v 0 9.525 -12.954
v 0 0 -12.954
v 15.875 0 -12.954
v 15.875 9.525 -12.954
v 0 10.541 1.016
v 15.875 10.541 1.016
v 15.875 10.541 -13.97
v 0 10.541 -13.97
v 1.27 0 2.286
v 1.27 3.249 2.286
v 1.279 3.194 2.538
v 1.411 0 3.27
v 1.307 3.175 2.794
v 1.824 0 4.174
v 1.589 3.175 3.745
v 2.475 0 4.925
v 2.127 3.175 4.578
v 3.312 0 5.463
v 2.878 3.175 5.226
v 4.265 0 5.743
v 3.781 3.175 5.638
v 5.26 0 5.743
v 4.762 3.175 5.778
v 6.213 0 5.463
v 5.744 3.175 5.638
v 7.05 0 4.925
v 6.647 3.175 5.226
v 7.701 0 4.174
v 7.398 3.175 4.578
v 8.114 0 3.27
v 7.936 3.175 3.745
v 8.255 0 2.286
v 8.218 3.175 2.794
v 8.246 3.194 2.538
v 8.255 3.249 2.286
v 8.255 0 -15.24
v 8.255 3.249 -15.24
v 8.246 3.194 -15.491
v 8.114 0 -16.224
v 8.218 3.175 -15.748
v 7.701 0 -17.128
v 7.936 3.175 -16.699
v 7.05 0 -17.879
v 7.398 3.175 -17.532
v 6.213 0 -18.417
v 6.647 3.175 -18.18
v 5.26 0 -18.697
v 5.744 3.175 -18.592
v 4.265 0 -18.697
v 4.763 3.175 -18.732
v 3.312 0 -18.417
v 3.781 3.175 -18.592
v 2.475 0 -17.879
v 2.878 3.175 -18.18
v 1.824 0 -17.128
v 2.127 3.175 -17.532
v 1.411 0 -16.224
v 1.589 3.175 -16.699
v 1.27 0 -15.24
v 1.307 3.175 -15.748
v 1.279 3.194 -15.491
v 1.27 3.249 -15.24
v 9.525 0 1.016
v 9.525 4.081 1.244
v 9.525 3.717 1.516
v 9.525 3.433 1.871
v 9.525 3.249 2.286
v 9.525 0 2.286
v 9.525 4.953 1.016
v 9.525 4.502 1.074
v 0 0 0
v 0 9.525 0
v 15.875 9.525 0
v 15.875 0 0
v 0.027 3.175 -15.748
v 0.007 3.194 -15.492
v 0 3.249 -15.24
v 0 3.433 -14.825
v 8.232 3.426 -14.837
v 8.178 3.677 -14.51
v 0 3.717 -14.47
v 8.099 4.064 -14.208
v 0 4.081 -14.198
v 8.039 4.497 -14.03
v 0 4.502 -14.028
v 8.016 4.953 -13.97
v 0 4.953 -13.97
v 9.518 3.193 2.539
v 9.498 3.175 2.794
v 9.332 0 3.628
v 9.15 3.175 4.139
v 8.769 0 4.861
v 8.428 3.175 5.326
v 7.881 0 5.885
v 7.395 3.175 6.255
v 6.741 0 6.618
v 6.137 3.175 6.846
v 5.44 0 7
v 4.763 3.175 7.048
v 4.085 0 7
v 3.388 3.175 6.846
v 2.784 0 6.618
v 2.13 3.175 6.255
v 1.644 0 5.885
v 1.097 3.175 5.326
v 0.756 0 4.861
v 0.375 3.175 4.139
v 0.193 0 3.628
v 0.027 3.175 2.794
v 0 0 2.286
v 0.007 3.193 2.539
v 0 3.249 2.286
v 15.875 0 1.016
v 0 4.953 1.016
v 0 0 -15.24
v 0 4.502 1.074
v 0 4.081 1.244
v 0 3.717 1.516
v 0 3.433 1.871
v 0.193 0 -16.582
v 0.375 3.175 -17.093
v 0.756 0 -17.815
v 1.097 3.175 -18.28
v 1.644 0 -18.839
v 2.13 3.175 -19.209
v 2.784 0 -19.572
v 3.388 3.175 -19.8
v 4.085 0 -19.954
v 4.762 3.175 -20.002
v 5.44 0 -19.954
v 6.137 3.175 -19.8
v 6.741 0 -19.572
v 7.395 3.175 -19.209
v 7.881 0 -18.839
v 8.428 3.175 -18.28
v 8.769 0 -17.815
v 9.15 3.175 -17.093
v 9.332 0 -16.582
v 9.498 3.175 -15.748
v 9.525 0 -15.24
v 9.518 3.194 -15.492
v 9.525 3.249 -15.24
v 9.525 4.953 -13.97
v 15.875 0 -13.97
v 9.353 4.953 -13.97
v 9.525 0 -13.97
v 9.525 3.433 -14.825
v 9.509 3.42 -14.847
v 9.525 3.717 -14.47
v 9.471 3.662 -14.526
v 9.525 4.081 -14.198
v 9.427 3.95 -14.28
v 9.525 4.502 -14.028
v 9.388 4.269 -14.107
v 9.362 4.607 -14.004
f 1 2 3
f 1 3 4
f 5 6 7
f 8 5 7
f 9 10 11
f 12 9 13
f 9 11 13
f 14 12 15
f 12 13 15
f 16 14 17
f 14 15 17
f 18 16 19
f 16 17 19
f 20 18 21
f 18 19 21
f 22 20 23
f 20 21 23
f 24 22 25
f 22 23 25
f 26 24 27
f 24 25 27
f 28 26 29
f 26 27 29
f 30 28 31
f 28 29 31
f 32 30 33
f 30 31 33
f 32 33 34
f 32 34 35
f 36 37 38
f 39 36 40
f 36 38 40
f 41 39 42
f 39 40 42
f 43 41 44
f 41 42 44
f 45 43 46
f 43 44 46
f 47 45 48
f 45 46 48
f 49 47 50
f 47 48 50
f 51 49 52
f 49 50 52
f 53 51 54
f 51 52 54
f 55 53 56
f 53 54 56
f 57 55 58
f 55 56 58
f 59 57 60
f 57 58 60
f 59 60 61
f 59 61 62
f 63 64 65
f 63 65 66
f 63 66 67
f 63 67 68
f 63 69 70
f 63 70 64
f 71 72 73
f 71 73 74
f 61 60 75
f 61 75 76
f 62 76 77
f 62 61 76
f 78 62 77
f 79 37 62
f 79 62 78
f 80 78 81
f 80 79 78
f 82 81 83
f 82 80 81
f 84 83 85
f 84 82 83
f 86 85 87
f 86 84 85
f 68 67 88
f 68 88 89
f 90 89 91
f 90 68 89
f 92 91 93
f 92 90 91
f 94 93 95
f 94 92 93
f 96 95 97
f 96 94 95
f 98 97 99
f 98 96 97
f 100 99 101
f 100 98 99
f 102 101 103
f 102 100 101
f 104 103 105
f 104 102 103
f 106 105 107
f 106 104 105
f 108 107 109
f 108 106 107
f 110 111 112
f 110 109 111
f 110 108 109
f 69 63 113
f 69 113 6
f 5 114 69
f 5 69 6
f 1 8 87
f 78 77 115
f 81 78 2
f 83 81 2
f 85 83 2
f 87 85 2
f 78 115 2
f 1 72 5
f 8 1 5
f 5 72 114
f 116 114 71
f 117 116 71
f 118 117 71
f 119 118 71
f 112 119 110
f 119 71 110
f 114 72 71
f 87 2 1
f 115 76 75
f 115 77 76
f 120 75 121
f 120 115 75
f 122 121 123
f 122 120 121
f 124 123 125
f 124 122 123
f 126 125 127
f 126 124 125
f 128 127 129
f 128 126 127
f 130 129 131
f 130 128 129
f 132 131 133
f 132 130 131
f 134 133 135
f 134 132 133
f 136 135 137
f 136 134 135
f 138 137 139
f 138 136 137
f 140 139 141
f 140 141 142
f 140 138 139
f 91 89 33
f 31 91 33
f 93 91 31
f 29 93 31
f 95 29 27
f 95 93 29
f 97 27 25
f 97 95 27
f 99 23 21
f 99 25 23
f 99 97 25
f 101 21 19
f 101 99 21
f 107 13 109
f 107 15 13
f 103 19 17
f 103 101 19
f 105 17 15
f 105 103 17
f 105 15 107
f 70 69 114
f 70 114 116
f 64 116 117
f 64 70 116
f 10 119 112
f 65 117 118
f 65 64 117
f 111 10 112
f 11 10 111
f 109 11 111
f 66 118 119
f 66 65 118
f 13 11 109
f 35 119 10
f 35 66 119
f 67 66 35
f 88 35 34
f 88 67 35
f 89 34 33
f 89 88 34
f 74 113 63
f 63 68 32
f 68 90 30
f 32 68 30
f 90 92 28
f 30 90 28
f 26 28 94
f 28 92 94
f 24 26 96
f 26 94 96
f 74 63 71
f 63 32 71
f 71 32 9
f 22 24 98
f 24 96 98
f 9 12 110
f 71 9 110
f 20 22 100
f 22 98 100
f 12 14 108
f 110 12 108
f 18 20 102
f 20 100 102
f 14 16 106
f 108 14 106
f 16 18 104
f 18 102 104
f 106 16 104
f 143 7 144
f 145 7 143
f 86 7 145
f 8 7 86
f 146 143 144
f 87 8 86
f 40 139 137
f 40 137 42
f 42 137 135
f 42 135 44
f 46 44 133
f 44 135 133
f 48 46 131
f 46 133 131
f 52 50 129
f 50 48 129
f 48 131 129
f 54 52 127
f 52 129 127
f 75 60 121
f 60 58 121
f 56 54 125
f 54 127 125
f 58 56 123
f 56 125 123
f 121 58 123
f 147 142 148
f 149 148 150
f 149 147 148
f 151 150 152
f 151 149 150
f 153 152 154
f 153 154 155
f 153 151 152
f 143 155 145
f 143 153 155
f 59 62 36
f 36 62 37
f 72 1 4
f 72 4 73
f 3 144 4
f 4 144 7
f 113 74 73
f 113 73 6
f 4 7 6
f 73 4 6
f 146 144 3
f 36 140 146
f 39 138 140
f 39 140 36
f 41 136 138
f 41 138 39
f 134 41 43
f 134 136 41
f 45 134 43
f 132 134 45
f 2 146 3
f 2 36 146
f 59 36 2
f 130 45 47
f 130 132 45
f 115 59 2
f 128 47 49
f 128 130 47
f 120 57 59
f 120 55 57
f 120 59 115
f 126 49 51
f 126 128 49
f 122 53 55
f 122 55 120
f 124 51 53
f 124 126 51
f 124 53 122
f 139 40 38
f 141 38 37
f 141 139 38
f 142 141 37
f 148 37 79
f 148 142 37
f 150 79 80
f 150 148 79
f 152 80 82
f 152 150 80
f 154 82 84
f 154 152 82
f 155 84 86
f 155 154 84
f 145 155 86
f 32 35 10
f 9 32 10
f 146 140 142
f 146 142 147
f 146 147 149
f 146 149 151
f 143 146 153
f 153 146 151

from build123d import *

# Parameters (mm, degrees)
BOSS_EXTRUDE1_DEPTH = 15.875
BOSS_EXTRUDE2_DEPTH = 3.175
CUT_EXTRUDE1_REACH  = 24.393
FILLET2_R           = 1.778
FILLET3_R           = 1.778


with BuildPart() as part:
    # Sketch1 → Boss-Extrude1 (new body)
    with BuildSketch(Plane(origin=(0, 0, 0), x_dir=(0, 0, -1), z_dir=(1, 0, 0))):
        Polygon((0, 0), (-1.016, 0), (-1.016, 10.541), (13.97, 10.541), (13.97, 0), (12.954, 0), (12.954, 9.525), (0, 9.525), align=None)
    extrude(amount=BOSS_EXTRUDE1_DEPTH)

    # Sketch2 → Boss-Extrude2 (add)
    with BuildSketch(Plane.XZ):
        with BuildLine():
            Line((9.525, 2.286), (9.525, 1.016))
            Line((9.525, 1.016), (0, 1.016))
            Line((0, 1.016), (0, 2.286))
            ThreePointArc((0, 2.286), (4.7625, 7.0485), (9.525, 2.286))
        make_face()
    boss_extrude2 = extrude(amount=-BOSS_EXTRUDE2_DEPTH)

    # Sketch4 → Cut-Extrude1 (cut, up to next)
    with BuildSketch(Plane(origin=(0, 3.175, 0), x_dir=(1, 0, 0), z_dir=(0, 1, 0)), mode=Mode.PRIVATE) as cut_extrude1_sk1:
        with BuildLine():
            Line((8.255, -2.286), (1.27, -2.286))
            ThreePointArc((1.27, -2.286), (4.7625, -5.7785), (8.255, -2.286))
        make_face()
    cut_extrude1_tool1 = extrude(cut_extrude1_sk1.sketch, amount=-CUT_EXTRUDE1_REACH, mode=Mode.PRIVATE) & part.part
    cut_extrude1 = cut_extrude1_tool1.solids().sort_by_distance((4.7625, 3.175, 3.768263))[0]
    add(cut_extrude1, mode=Mode.SUBTRACT)

    # Fillet2
    # the kernel refuses this fillet: 1.778 mm, written as the material it adds along each edge
    with BuildSketch(Plane(origin=(9.525, 3.175, 1.016), x_dir=(0, 1, 0), z_dir=(-1, 0, 0))) as fillet2_piece_1_section:
        with BuildLine():
            CenterArc((FILLET2_R, -FILLET2_R), FILLET2_R, 90, 90)
            Line((0, -FILLET2_R), (0, 0))
            Line((0, 0), (FILLET2_R, 0))
        make_face()
    fillet2_piece_1 = extrude(amount=9.525, mode=Mode.PRIVATE)
    fillet2_piece_1 = split(fillet2_piece_1, bisect_by=Plane(origin=(9.463917271, 3.688621556, 2.286), z_dir=(0, 0, -1)), keep=Keep.TOP, mode=Mode.PRIVATE)
    add(fillet2_piece_1)
    with BuildSketch(Plane(origin=(13.97, 3.175, 1.016), x_dir=(0, 1, 0), z_dir=(-1, 0, 0))) as fillet2_piece_2_section:
        with BuildLine():
            CenterArc((FILLET2_R, -FILLET2_R), FILLET2_R, 90, 90)
            Line((0, -FILLET2_R), (0, 0))
            Line((0, 0), (FILLET2_R, 0))
        make_face()
    fillet2_piece_2 = extrude(amount=18.415, mode=Mode.PRIVATE)
    fillet2_piece_2 = fillet2_piece_2 & Plane(origin=(4.7625, 3.197144068, 2.286), x_dir=(-1, 0, 0), z_dir=(0, -1, 0)) * Cylinder(4.7625, 44, mode=Mode.PRIVATE)
    fillet2_piece_2 = fillet2_piece_2 - Plane(origin=(4.7625, 3.197144068, 2.286), x_dir=(-1, 0, 0), z_dir=(0, 1, 0)) * Cylinder(3.4925, 44, mode=Mode.PRIVATE)
    add(fillet2_piece_2)

    # Mirror2: Boss-Extrude2 across plane
    add(boss_extrude2.mirror(Plane.XY.offset(-6.477)))

    # Mirror3: Cut-Extrude1 across plane
    add(cut_extrude1.mirror(Plane.XY.offset(-6.477)), mode=Mode.SUBTRACT)

    # Fillet3
    # the kernel refuses this fillet: 1.778 mm, written as the material it adds along each edge
    with BuildSketch(Plane(origin=(9.525, 3.175, -13.97), x_dir=(0, 0, -1), z_dir=(-1, 0, 0))) as fillet3_piece_1_section:
        with BuildLine():
            CenterArc((FILLET3_R, -FILLET3_R), FILLET3_R, 90, 90)
            Line((0, -FILLET3_R), (0, 0))
            Line((0, 0), (FILLET3_R, 0))
        make_face()
    fillet3_piece_1 = extrude(amount=9.525, mode=Mode.PRIVATE)
    fillet3_piece_1 = split(fillet3_piece_1, bisect_by=Plane(origin=(9.46391727, 3.688621585, -15.24), z_dir=(0, 0, 1)), keep=Keep.TOP, mode=Mode.PRIVATE)
    add(fillet3_piece_1)
    with BuildSketch(Plane(origin=(13.97, 3.175, -13.97), x_dir=(0, 0, -1), z_dir=(-1, 0, 0))) as fillet3_piece_2_section:
        with BuildLine():
            CenterArc((FILLET3_R, -FILLET3_R), FILLET3_R, 90, 90)
            Line((0, -FILLET3_R), (0, 0))
            Line((0, 0), (FILLET3_R, 0))
        make_face()
    fillet3_piece_2 = extrude(amount=18.415, mode=Mode.PRIVATE)
    fillet3_piece_2 = fillet3_piece_2 & Plane(origin=(4.7625, 3.197144068, -15.24), x_dir=(-1, 0, 0), z_dir=(0, -1, 0)) * Cylinder(4.7625, 44, mode=Mode.PRIVATE)
    fillet3_piece_2 = fillet3_piece_2 - Plane(origin=(4.7625, 3.197144068, -15.24), x_dir=(-1, 0, 0), z_dir=(0, 1, 0)) * Cylinder(3.4925, 44, mode=Mode.PRIVATE)
    add(fillet3_piece_2)


solid = part.part
